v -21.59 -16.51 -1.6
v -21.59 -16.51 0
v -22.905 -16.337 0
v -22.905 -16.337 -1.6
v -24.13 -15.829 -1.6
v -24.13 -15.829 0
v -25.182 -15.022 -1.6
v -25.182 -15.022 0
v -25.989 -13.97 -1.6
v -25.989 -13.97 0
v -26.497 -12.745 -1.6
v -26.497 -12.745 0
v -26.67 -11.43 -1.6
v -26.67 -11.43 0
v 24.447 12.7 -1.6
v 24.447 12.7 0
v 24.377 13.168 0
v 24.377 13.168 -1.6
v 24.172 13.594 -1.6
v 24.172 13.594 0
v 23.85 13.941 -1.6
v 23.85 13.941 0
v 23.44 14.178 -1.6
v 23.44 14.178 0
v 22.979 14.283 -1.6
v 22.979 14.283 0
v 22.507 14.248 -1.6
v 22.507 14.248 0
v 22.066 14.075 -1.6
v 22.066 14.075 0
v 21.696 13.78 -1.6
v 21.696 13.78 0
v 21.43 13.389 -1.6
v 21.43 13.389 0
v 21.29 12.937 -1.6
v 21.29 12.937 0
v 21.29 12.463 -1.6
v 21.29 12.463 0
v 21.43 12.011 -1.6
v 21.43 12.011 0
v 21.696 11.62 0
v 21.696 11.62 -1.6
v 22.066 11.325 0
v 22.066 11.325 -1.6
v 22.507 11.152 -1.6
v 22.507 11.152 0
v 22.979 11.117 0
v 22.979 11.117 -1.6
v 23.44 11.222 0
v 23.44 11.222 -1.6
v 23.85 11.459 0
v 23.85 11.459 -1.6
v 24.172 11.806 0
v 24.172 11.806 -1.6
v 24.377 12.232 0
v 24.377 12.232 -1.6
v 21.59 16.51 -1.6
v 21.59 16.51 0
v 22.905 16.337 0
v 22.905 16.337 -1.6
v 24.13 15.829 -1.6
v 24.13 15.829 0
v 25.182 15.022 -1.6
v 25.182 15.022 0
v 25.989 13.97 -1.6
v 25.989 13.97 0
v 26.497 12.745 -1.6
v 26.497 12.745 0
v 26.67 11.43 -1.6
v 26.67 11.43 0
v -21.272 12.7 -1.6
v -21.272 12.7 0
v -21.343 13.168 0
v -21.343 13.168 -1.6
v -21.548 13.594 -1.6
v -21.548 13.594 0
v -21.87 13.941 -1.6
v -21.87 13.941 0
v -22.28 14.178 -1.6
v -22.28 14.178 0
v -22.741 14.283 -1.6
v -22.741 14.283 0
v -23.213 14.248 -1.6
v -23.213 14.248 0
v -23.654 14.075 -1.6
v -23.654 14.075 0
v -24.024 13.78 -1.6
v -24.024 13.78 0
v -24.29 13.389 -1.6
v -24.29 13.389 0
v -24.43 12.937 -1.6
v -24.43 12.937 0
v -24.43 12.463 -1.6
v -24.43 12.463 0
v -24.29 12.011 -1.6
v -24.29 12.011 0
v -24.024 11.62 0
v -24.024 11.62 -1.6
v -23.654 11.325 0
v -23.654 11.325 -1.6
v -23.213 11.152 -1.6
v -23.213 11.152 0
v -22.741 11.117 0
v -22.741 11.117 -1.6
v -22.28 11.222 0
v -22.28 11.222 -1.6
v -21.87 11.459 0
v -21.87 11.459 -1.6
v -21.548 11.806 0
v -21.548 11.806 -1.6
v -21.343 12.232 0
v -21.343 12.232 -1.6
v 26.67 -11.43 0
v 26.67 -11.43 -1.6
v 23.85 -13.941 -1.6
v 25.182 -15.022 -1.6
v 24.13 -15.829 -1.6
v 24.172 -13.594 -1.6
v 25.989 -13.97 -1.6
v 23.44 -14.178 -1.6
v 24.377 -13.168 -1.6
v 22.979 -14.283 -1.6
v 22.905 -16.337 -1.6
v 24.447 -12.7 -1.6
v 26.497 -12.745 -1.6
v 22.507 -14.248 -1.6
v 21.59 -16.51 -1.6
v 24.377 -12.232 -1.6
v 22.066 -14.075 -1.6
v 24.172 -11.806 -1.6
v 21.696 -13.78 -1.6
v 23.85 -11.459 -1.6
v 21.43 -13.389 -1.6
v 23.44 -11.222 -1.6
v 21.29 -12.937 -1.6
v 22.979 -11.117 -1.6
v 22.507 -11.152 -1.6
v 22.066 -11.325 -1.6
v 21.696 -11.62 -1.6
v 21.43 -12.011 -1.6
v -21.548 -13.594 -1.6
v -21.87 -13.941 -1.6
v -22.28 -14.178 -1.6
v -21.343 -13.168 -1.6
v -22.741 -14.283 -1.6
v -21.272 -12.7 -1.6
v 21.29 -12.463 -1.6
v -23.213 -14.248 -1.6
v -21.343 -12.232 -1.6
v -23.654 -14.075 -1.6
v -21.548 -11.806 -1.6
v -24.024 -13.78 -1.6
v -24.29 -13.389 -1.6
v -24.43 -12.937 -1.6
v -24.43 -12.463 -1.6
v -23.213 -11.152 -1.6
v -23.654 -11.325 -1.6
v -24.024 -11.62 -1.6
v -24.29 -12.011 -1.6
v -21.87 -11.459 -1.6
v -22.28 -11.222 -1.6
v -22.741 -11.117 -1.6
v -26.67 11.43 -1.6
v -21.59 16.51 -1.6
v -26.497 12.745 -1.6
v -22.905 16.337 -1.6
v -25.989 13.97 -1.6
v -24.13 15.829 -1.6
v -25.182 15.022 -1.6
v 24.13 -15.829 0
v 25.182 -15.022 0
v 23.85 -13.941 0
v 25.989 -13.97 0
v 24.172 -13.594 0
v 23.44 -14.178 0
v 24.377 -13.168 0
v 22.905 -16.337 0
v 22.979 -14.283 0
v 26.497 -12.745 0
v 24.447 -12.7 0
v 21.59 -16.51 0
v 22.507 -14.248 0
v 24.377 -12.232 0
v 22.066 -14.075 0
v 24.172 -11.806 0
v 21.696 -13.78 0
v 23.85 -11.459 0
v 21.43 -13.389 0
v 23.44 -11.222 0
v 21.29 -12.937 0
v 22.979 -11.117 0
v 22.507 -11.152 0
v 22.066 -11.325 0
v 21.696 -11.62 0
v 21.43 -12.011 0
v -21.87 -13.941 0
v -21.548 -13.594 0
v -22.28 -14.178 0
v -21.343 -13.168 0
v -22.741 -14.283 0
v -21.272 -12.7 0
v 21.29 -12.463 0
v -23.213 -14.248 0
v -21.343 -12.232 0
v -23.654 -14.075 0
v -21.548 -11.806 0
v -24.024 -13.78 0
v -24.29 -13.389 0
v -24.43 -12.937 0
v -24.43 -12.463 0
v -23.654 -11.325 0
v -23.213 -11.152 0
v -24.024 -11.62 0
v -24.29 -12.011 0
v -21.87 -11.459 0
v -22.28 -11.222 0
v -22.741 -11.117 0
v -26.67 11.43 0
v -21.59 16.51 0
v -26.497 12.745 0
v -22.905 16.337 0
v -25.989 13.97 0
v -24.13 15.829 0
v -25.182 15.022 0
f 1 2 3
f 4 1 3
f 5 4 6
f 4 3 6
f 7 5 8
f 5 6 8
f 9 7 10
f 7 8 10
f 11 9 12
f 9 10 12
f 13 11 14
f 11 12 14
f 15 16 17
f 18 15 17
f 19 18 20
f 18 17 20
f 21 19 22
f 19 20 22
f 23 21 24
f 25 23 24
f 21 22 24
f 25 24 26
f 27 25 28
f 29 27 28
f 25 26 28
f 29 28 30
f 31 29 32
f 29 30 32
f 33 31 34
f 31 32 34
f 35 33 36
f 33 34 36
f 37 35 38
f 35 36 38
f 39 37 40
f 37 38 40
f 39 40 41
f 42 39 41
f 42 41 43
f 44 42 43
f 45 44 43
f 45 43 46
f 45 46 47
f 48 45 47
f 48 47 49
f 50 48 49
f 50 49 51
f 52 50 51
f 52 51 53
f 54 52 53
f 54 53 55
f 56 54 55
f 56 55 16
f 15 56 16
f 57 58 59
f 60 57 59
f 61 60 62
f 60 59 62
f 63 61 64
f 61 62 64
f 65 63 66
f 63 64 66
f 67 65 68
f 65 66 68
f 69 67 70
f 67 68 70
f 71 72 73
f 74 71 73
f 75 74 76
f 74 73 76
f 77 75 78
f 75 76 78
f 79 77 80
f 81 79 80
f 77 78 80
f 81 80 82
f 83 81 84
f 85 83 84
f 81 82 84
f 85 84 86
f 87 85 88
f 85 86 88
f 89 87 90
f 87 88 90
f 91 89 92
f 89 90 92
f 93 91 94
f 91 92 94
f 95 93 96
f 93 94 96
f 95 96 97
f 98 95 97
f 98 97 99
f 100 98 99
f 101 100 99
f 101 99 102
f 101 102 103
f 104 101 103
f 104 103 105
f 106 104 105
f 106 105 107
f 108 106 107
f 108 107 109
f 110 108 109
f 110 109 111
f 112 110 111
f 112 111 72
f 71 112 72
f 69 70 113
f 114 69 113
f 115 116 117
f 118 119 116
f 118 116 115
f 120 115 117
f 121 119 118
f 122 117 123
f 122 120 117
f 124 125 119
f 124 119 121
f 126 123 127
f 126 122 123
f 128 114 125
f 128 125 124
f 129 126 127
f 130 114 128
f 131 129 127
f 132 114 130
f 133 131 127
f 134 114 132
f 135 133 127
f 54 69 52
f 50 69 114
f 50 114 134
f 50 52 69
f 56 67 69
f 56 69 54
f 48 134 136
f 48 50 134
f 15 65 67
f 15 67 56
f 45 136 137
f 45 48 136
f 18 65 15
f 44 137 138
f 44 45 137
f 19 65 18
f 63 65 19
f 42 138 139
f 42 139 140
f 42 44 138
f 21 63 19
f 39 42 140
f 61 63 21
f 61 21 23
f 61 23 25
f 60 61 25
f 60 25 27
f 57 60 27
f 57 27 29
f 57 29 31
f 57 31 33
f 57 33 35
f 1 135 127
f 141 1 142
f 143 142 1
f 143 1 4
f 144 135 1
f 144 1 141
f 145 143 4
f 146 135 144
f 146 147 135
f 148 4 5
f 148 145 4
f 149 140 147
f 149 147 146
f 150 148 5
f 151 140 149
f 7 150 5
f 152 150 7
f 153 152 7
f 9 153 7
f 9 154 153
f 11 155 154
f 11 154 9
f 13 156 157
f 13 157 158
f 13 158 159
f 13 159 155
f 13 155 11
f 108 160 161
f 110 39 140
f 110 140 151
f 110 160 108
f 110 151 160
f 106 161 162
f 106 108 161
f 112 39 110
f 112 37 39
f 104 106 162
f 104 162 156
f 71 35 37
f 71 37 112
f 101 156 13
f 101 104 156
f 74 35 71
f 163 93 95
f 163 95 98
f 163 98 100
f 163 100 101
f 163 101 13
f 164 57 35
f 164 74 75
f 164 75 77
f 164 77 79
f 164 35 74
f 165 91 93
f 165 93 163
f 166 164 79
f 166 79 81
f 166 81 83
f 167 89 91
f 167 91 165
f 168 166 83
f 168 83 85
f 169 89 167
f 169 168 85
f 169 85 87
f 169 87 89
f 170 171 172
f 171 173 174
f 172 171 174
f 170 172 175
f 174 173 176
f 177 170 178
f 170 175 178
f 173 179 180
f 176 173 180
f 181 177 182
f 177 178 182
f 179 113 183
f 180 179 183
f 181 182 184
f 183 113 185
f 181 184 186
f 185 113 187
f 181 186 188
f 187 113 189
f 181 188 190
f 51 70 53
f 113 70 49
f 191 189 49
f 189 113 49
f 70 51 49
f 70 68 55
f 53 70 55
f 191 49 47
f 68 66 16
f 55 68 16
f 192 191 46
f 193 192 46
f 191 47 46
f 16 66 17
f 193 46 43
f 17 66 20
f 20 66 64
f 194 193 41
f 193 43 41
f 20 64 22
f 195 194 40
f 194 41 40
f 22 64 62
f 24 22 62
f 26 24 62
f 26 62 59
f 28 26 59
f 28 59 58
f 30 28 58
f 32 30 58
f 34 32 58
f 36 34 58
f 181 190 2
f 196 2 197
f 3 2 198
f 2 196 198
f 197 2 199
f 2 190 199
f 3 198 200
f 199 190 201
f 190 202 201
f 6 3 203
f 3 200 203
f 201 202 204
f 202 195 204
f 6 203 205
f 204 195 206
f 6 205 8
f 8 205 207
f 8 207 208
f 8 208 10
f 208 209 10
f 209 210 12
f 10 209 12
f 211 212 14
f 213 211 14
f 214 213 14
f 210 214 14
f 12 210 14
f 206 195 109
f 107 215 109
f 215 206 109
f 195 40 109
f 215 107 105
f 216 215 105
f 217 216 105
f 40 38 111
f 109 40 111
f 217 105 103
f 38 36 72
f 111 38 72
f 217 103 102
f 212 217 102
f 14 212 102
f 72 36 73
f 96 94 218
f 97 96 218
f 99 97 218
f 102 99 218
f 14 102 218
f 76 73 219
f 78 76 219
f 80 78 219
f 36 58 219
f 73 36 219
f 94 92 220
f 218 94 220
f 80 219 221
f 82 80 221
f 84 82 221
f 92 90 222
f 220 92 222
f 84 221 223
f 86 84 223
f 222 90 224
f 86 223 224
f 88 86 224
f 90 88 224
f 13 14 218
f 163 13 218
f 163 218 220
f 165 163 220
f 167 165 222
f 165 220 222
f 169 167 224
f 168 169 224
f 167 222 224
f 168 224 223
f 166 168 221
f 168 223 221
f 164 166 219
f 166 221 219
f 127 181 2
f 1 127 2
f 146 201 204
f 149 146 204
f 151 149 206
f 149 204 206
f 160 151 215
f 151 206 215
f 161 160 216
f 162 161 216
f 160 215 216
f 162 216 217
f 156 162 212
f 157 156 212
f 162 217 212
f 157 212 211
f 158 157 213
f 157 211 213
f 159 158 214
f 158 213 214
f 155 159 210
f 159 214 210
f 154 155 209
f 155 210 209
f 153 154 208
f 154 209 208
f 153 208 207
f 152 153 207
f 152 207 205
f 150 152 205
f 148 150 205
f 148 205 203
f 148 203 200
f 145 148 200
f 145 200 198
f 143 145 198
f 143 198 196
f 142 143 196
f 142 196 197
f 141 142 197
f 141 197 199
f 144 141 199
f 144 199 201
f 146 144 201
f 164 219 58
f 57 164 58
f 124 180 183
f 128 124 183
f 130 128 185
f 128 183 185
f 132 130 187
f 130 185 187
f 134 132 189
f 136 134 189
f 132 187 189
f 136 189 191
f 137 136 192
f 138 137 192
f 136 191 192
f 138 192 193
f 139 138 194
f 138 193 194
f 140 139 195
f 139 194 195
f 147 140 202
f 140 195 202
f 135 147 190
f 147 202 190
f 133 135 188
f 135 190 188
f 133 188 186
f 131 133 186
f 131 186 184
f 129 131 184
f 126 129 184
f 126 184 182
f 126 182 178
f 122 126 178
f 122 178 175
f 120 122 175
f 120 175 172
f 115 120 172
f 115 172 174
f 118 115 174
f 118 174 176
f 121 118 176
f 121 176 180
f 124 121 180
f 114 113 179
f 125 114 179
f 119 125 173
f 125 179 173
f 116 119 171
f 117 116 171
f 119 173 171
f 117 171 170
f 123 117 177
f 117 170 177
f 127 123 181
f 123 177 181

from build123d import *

# Parameters (mm, degrees)
BOSS_EXTRUDE1_DEPTH = 1.6002
SKETCH2_R           = 1.5875
CUT_EXTRUDE1_DEPTH  = 11.7602


with BuildPart() as part:
    # Sketch1 → Boss-Extrude1 (new body)
    with BuildSketch(Plane.XY):
        with BuildLine():
            Line((-21.59, 16.51), (21.59, 16.51))
            ThreePointArc((21.59, 16.51), (25.182102448, 15.022102448), (26.67, 11.43))
            Line((26.67, 11.43), (26.67, -11.43))
            ThreePointArc((26.67, -11.43), (25.182102448, -15.022102448), (21.59, -16.51))
            Line((21.59, -16.51), (-21.59, -16.51))
            ThreePointArc((-21.59, -16.51), (-25.182102448, -15.022102448), (-26.67, -11.43))
            Line((-26.67, -11.43), (-26.67, 11.43))
            ThreePointArc((-26.67, 11.43), (-25.182102448, 15.022102448), (-21.59, 16.51))
        make_face()
    extrude(amount=-BOSS_EXTRUDE1_DEPTH)

    # Sketch2 → Cut-Extrude1 (cut)
    with BuildSketch(Plane.XY):
        with Locations((-22.86, 12.7)):
            Circle(SKETCH2_R)
        with Locations((-22.86, -12.7)):
            Circle(SKETCH2_R)
        with Locations((22.86, 12.7)):
            Circle(SKETCH2_R)
        with Locations((22.86, -12.7)):
            Circle(SKETCH2_R)
    extrude(amount=-CUT_EXTRUDE1_DEPTH, mode=Mode.SUBTRACT)


solid = part.part
